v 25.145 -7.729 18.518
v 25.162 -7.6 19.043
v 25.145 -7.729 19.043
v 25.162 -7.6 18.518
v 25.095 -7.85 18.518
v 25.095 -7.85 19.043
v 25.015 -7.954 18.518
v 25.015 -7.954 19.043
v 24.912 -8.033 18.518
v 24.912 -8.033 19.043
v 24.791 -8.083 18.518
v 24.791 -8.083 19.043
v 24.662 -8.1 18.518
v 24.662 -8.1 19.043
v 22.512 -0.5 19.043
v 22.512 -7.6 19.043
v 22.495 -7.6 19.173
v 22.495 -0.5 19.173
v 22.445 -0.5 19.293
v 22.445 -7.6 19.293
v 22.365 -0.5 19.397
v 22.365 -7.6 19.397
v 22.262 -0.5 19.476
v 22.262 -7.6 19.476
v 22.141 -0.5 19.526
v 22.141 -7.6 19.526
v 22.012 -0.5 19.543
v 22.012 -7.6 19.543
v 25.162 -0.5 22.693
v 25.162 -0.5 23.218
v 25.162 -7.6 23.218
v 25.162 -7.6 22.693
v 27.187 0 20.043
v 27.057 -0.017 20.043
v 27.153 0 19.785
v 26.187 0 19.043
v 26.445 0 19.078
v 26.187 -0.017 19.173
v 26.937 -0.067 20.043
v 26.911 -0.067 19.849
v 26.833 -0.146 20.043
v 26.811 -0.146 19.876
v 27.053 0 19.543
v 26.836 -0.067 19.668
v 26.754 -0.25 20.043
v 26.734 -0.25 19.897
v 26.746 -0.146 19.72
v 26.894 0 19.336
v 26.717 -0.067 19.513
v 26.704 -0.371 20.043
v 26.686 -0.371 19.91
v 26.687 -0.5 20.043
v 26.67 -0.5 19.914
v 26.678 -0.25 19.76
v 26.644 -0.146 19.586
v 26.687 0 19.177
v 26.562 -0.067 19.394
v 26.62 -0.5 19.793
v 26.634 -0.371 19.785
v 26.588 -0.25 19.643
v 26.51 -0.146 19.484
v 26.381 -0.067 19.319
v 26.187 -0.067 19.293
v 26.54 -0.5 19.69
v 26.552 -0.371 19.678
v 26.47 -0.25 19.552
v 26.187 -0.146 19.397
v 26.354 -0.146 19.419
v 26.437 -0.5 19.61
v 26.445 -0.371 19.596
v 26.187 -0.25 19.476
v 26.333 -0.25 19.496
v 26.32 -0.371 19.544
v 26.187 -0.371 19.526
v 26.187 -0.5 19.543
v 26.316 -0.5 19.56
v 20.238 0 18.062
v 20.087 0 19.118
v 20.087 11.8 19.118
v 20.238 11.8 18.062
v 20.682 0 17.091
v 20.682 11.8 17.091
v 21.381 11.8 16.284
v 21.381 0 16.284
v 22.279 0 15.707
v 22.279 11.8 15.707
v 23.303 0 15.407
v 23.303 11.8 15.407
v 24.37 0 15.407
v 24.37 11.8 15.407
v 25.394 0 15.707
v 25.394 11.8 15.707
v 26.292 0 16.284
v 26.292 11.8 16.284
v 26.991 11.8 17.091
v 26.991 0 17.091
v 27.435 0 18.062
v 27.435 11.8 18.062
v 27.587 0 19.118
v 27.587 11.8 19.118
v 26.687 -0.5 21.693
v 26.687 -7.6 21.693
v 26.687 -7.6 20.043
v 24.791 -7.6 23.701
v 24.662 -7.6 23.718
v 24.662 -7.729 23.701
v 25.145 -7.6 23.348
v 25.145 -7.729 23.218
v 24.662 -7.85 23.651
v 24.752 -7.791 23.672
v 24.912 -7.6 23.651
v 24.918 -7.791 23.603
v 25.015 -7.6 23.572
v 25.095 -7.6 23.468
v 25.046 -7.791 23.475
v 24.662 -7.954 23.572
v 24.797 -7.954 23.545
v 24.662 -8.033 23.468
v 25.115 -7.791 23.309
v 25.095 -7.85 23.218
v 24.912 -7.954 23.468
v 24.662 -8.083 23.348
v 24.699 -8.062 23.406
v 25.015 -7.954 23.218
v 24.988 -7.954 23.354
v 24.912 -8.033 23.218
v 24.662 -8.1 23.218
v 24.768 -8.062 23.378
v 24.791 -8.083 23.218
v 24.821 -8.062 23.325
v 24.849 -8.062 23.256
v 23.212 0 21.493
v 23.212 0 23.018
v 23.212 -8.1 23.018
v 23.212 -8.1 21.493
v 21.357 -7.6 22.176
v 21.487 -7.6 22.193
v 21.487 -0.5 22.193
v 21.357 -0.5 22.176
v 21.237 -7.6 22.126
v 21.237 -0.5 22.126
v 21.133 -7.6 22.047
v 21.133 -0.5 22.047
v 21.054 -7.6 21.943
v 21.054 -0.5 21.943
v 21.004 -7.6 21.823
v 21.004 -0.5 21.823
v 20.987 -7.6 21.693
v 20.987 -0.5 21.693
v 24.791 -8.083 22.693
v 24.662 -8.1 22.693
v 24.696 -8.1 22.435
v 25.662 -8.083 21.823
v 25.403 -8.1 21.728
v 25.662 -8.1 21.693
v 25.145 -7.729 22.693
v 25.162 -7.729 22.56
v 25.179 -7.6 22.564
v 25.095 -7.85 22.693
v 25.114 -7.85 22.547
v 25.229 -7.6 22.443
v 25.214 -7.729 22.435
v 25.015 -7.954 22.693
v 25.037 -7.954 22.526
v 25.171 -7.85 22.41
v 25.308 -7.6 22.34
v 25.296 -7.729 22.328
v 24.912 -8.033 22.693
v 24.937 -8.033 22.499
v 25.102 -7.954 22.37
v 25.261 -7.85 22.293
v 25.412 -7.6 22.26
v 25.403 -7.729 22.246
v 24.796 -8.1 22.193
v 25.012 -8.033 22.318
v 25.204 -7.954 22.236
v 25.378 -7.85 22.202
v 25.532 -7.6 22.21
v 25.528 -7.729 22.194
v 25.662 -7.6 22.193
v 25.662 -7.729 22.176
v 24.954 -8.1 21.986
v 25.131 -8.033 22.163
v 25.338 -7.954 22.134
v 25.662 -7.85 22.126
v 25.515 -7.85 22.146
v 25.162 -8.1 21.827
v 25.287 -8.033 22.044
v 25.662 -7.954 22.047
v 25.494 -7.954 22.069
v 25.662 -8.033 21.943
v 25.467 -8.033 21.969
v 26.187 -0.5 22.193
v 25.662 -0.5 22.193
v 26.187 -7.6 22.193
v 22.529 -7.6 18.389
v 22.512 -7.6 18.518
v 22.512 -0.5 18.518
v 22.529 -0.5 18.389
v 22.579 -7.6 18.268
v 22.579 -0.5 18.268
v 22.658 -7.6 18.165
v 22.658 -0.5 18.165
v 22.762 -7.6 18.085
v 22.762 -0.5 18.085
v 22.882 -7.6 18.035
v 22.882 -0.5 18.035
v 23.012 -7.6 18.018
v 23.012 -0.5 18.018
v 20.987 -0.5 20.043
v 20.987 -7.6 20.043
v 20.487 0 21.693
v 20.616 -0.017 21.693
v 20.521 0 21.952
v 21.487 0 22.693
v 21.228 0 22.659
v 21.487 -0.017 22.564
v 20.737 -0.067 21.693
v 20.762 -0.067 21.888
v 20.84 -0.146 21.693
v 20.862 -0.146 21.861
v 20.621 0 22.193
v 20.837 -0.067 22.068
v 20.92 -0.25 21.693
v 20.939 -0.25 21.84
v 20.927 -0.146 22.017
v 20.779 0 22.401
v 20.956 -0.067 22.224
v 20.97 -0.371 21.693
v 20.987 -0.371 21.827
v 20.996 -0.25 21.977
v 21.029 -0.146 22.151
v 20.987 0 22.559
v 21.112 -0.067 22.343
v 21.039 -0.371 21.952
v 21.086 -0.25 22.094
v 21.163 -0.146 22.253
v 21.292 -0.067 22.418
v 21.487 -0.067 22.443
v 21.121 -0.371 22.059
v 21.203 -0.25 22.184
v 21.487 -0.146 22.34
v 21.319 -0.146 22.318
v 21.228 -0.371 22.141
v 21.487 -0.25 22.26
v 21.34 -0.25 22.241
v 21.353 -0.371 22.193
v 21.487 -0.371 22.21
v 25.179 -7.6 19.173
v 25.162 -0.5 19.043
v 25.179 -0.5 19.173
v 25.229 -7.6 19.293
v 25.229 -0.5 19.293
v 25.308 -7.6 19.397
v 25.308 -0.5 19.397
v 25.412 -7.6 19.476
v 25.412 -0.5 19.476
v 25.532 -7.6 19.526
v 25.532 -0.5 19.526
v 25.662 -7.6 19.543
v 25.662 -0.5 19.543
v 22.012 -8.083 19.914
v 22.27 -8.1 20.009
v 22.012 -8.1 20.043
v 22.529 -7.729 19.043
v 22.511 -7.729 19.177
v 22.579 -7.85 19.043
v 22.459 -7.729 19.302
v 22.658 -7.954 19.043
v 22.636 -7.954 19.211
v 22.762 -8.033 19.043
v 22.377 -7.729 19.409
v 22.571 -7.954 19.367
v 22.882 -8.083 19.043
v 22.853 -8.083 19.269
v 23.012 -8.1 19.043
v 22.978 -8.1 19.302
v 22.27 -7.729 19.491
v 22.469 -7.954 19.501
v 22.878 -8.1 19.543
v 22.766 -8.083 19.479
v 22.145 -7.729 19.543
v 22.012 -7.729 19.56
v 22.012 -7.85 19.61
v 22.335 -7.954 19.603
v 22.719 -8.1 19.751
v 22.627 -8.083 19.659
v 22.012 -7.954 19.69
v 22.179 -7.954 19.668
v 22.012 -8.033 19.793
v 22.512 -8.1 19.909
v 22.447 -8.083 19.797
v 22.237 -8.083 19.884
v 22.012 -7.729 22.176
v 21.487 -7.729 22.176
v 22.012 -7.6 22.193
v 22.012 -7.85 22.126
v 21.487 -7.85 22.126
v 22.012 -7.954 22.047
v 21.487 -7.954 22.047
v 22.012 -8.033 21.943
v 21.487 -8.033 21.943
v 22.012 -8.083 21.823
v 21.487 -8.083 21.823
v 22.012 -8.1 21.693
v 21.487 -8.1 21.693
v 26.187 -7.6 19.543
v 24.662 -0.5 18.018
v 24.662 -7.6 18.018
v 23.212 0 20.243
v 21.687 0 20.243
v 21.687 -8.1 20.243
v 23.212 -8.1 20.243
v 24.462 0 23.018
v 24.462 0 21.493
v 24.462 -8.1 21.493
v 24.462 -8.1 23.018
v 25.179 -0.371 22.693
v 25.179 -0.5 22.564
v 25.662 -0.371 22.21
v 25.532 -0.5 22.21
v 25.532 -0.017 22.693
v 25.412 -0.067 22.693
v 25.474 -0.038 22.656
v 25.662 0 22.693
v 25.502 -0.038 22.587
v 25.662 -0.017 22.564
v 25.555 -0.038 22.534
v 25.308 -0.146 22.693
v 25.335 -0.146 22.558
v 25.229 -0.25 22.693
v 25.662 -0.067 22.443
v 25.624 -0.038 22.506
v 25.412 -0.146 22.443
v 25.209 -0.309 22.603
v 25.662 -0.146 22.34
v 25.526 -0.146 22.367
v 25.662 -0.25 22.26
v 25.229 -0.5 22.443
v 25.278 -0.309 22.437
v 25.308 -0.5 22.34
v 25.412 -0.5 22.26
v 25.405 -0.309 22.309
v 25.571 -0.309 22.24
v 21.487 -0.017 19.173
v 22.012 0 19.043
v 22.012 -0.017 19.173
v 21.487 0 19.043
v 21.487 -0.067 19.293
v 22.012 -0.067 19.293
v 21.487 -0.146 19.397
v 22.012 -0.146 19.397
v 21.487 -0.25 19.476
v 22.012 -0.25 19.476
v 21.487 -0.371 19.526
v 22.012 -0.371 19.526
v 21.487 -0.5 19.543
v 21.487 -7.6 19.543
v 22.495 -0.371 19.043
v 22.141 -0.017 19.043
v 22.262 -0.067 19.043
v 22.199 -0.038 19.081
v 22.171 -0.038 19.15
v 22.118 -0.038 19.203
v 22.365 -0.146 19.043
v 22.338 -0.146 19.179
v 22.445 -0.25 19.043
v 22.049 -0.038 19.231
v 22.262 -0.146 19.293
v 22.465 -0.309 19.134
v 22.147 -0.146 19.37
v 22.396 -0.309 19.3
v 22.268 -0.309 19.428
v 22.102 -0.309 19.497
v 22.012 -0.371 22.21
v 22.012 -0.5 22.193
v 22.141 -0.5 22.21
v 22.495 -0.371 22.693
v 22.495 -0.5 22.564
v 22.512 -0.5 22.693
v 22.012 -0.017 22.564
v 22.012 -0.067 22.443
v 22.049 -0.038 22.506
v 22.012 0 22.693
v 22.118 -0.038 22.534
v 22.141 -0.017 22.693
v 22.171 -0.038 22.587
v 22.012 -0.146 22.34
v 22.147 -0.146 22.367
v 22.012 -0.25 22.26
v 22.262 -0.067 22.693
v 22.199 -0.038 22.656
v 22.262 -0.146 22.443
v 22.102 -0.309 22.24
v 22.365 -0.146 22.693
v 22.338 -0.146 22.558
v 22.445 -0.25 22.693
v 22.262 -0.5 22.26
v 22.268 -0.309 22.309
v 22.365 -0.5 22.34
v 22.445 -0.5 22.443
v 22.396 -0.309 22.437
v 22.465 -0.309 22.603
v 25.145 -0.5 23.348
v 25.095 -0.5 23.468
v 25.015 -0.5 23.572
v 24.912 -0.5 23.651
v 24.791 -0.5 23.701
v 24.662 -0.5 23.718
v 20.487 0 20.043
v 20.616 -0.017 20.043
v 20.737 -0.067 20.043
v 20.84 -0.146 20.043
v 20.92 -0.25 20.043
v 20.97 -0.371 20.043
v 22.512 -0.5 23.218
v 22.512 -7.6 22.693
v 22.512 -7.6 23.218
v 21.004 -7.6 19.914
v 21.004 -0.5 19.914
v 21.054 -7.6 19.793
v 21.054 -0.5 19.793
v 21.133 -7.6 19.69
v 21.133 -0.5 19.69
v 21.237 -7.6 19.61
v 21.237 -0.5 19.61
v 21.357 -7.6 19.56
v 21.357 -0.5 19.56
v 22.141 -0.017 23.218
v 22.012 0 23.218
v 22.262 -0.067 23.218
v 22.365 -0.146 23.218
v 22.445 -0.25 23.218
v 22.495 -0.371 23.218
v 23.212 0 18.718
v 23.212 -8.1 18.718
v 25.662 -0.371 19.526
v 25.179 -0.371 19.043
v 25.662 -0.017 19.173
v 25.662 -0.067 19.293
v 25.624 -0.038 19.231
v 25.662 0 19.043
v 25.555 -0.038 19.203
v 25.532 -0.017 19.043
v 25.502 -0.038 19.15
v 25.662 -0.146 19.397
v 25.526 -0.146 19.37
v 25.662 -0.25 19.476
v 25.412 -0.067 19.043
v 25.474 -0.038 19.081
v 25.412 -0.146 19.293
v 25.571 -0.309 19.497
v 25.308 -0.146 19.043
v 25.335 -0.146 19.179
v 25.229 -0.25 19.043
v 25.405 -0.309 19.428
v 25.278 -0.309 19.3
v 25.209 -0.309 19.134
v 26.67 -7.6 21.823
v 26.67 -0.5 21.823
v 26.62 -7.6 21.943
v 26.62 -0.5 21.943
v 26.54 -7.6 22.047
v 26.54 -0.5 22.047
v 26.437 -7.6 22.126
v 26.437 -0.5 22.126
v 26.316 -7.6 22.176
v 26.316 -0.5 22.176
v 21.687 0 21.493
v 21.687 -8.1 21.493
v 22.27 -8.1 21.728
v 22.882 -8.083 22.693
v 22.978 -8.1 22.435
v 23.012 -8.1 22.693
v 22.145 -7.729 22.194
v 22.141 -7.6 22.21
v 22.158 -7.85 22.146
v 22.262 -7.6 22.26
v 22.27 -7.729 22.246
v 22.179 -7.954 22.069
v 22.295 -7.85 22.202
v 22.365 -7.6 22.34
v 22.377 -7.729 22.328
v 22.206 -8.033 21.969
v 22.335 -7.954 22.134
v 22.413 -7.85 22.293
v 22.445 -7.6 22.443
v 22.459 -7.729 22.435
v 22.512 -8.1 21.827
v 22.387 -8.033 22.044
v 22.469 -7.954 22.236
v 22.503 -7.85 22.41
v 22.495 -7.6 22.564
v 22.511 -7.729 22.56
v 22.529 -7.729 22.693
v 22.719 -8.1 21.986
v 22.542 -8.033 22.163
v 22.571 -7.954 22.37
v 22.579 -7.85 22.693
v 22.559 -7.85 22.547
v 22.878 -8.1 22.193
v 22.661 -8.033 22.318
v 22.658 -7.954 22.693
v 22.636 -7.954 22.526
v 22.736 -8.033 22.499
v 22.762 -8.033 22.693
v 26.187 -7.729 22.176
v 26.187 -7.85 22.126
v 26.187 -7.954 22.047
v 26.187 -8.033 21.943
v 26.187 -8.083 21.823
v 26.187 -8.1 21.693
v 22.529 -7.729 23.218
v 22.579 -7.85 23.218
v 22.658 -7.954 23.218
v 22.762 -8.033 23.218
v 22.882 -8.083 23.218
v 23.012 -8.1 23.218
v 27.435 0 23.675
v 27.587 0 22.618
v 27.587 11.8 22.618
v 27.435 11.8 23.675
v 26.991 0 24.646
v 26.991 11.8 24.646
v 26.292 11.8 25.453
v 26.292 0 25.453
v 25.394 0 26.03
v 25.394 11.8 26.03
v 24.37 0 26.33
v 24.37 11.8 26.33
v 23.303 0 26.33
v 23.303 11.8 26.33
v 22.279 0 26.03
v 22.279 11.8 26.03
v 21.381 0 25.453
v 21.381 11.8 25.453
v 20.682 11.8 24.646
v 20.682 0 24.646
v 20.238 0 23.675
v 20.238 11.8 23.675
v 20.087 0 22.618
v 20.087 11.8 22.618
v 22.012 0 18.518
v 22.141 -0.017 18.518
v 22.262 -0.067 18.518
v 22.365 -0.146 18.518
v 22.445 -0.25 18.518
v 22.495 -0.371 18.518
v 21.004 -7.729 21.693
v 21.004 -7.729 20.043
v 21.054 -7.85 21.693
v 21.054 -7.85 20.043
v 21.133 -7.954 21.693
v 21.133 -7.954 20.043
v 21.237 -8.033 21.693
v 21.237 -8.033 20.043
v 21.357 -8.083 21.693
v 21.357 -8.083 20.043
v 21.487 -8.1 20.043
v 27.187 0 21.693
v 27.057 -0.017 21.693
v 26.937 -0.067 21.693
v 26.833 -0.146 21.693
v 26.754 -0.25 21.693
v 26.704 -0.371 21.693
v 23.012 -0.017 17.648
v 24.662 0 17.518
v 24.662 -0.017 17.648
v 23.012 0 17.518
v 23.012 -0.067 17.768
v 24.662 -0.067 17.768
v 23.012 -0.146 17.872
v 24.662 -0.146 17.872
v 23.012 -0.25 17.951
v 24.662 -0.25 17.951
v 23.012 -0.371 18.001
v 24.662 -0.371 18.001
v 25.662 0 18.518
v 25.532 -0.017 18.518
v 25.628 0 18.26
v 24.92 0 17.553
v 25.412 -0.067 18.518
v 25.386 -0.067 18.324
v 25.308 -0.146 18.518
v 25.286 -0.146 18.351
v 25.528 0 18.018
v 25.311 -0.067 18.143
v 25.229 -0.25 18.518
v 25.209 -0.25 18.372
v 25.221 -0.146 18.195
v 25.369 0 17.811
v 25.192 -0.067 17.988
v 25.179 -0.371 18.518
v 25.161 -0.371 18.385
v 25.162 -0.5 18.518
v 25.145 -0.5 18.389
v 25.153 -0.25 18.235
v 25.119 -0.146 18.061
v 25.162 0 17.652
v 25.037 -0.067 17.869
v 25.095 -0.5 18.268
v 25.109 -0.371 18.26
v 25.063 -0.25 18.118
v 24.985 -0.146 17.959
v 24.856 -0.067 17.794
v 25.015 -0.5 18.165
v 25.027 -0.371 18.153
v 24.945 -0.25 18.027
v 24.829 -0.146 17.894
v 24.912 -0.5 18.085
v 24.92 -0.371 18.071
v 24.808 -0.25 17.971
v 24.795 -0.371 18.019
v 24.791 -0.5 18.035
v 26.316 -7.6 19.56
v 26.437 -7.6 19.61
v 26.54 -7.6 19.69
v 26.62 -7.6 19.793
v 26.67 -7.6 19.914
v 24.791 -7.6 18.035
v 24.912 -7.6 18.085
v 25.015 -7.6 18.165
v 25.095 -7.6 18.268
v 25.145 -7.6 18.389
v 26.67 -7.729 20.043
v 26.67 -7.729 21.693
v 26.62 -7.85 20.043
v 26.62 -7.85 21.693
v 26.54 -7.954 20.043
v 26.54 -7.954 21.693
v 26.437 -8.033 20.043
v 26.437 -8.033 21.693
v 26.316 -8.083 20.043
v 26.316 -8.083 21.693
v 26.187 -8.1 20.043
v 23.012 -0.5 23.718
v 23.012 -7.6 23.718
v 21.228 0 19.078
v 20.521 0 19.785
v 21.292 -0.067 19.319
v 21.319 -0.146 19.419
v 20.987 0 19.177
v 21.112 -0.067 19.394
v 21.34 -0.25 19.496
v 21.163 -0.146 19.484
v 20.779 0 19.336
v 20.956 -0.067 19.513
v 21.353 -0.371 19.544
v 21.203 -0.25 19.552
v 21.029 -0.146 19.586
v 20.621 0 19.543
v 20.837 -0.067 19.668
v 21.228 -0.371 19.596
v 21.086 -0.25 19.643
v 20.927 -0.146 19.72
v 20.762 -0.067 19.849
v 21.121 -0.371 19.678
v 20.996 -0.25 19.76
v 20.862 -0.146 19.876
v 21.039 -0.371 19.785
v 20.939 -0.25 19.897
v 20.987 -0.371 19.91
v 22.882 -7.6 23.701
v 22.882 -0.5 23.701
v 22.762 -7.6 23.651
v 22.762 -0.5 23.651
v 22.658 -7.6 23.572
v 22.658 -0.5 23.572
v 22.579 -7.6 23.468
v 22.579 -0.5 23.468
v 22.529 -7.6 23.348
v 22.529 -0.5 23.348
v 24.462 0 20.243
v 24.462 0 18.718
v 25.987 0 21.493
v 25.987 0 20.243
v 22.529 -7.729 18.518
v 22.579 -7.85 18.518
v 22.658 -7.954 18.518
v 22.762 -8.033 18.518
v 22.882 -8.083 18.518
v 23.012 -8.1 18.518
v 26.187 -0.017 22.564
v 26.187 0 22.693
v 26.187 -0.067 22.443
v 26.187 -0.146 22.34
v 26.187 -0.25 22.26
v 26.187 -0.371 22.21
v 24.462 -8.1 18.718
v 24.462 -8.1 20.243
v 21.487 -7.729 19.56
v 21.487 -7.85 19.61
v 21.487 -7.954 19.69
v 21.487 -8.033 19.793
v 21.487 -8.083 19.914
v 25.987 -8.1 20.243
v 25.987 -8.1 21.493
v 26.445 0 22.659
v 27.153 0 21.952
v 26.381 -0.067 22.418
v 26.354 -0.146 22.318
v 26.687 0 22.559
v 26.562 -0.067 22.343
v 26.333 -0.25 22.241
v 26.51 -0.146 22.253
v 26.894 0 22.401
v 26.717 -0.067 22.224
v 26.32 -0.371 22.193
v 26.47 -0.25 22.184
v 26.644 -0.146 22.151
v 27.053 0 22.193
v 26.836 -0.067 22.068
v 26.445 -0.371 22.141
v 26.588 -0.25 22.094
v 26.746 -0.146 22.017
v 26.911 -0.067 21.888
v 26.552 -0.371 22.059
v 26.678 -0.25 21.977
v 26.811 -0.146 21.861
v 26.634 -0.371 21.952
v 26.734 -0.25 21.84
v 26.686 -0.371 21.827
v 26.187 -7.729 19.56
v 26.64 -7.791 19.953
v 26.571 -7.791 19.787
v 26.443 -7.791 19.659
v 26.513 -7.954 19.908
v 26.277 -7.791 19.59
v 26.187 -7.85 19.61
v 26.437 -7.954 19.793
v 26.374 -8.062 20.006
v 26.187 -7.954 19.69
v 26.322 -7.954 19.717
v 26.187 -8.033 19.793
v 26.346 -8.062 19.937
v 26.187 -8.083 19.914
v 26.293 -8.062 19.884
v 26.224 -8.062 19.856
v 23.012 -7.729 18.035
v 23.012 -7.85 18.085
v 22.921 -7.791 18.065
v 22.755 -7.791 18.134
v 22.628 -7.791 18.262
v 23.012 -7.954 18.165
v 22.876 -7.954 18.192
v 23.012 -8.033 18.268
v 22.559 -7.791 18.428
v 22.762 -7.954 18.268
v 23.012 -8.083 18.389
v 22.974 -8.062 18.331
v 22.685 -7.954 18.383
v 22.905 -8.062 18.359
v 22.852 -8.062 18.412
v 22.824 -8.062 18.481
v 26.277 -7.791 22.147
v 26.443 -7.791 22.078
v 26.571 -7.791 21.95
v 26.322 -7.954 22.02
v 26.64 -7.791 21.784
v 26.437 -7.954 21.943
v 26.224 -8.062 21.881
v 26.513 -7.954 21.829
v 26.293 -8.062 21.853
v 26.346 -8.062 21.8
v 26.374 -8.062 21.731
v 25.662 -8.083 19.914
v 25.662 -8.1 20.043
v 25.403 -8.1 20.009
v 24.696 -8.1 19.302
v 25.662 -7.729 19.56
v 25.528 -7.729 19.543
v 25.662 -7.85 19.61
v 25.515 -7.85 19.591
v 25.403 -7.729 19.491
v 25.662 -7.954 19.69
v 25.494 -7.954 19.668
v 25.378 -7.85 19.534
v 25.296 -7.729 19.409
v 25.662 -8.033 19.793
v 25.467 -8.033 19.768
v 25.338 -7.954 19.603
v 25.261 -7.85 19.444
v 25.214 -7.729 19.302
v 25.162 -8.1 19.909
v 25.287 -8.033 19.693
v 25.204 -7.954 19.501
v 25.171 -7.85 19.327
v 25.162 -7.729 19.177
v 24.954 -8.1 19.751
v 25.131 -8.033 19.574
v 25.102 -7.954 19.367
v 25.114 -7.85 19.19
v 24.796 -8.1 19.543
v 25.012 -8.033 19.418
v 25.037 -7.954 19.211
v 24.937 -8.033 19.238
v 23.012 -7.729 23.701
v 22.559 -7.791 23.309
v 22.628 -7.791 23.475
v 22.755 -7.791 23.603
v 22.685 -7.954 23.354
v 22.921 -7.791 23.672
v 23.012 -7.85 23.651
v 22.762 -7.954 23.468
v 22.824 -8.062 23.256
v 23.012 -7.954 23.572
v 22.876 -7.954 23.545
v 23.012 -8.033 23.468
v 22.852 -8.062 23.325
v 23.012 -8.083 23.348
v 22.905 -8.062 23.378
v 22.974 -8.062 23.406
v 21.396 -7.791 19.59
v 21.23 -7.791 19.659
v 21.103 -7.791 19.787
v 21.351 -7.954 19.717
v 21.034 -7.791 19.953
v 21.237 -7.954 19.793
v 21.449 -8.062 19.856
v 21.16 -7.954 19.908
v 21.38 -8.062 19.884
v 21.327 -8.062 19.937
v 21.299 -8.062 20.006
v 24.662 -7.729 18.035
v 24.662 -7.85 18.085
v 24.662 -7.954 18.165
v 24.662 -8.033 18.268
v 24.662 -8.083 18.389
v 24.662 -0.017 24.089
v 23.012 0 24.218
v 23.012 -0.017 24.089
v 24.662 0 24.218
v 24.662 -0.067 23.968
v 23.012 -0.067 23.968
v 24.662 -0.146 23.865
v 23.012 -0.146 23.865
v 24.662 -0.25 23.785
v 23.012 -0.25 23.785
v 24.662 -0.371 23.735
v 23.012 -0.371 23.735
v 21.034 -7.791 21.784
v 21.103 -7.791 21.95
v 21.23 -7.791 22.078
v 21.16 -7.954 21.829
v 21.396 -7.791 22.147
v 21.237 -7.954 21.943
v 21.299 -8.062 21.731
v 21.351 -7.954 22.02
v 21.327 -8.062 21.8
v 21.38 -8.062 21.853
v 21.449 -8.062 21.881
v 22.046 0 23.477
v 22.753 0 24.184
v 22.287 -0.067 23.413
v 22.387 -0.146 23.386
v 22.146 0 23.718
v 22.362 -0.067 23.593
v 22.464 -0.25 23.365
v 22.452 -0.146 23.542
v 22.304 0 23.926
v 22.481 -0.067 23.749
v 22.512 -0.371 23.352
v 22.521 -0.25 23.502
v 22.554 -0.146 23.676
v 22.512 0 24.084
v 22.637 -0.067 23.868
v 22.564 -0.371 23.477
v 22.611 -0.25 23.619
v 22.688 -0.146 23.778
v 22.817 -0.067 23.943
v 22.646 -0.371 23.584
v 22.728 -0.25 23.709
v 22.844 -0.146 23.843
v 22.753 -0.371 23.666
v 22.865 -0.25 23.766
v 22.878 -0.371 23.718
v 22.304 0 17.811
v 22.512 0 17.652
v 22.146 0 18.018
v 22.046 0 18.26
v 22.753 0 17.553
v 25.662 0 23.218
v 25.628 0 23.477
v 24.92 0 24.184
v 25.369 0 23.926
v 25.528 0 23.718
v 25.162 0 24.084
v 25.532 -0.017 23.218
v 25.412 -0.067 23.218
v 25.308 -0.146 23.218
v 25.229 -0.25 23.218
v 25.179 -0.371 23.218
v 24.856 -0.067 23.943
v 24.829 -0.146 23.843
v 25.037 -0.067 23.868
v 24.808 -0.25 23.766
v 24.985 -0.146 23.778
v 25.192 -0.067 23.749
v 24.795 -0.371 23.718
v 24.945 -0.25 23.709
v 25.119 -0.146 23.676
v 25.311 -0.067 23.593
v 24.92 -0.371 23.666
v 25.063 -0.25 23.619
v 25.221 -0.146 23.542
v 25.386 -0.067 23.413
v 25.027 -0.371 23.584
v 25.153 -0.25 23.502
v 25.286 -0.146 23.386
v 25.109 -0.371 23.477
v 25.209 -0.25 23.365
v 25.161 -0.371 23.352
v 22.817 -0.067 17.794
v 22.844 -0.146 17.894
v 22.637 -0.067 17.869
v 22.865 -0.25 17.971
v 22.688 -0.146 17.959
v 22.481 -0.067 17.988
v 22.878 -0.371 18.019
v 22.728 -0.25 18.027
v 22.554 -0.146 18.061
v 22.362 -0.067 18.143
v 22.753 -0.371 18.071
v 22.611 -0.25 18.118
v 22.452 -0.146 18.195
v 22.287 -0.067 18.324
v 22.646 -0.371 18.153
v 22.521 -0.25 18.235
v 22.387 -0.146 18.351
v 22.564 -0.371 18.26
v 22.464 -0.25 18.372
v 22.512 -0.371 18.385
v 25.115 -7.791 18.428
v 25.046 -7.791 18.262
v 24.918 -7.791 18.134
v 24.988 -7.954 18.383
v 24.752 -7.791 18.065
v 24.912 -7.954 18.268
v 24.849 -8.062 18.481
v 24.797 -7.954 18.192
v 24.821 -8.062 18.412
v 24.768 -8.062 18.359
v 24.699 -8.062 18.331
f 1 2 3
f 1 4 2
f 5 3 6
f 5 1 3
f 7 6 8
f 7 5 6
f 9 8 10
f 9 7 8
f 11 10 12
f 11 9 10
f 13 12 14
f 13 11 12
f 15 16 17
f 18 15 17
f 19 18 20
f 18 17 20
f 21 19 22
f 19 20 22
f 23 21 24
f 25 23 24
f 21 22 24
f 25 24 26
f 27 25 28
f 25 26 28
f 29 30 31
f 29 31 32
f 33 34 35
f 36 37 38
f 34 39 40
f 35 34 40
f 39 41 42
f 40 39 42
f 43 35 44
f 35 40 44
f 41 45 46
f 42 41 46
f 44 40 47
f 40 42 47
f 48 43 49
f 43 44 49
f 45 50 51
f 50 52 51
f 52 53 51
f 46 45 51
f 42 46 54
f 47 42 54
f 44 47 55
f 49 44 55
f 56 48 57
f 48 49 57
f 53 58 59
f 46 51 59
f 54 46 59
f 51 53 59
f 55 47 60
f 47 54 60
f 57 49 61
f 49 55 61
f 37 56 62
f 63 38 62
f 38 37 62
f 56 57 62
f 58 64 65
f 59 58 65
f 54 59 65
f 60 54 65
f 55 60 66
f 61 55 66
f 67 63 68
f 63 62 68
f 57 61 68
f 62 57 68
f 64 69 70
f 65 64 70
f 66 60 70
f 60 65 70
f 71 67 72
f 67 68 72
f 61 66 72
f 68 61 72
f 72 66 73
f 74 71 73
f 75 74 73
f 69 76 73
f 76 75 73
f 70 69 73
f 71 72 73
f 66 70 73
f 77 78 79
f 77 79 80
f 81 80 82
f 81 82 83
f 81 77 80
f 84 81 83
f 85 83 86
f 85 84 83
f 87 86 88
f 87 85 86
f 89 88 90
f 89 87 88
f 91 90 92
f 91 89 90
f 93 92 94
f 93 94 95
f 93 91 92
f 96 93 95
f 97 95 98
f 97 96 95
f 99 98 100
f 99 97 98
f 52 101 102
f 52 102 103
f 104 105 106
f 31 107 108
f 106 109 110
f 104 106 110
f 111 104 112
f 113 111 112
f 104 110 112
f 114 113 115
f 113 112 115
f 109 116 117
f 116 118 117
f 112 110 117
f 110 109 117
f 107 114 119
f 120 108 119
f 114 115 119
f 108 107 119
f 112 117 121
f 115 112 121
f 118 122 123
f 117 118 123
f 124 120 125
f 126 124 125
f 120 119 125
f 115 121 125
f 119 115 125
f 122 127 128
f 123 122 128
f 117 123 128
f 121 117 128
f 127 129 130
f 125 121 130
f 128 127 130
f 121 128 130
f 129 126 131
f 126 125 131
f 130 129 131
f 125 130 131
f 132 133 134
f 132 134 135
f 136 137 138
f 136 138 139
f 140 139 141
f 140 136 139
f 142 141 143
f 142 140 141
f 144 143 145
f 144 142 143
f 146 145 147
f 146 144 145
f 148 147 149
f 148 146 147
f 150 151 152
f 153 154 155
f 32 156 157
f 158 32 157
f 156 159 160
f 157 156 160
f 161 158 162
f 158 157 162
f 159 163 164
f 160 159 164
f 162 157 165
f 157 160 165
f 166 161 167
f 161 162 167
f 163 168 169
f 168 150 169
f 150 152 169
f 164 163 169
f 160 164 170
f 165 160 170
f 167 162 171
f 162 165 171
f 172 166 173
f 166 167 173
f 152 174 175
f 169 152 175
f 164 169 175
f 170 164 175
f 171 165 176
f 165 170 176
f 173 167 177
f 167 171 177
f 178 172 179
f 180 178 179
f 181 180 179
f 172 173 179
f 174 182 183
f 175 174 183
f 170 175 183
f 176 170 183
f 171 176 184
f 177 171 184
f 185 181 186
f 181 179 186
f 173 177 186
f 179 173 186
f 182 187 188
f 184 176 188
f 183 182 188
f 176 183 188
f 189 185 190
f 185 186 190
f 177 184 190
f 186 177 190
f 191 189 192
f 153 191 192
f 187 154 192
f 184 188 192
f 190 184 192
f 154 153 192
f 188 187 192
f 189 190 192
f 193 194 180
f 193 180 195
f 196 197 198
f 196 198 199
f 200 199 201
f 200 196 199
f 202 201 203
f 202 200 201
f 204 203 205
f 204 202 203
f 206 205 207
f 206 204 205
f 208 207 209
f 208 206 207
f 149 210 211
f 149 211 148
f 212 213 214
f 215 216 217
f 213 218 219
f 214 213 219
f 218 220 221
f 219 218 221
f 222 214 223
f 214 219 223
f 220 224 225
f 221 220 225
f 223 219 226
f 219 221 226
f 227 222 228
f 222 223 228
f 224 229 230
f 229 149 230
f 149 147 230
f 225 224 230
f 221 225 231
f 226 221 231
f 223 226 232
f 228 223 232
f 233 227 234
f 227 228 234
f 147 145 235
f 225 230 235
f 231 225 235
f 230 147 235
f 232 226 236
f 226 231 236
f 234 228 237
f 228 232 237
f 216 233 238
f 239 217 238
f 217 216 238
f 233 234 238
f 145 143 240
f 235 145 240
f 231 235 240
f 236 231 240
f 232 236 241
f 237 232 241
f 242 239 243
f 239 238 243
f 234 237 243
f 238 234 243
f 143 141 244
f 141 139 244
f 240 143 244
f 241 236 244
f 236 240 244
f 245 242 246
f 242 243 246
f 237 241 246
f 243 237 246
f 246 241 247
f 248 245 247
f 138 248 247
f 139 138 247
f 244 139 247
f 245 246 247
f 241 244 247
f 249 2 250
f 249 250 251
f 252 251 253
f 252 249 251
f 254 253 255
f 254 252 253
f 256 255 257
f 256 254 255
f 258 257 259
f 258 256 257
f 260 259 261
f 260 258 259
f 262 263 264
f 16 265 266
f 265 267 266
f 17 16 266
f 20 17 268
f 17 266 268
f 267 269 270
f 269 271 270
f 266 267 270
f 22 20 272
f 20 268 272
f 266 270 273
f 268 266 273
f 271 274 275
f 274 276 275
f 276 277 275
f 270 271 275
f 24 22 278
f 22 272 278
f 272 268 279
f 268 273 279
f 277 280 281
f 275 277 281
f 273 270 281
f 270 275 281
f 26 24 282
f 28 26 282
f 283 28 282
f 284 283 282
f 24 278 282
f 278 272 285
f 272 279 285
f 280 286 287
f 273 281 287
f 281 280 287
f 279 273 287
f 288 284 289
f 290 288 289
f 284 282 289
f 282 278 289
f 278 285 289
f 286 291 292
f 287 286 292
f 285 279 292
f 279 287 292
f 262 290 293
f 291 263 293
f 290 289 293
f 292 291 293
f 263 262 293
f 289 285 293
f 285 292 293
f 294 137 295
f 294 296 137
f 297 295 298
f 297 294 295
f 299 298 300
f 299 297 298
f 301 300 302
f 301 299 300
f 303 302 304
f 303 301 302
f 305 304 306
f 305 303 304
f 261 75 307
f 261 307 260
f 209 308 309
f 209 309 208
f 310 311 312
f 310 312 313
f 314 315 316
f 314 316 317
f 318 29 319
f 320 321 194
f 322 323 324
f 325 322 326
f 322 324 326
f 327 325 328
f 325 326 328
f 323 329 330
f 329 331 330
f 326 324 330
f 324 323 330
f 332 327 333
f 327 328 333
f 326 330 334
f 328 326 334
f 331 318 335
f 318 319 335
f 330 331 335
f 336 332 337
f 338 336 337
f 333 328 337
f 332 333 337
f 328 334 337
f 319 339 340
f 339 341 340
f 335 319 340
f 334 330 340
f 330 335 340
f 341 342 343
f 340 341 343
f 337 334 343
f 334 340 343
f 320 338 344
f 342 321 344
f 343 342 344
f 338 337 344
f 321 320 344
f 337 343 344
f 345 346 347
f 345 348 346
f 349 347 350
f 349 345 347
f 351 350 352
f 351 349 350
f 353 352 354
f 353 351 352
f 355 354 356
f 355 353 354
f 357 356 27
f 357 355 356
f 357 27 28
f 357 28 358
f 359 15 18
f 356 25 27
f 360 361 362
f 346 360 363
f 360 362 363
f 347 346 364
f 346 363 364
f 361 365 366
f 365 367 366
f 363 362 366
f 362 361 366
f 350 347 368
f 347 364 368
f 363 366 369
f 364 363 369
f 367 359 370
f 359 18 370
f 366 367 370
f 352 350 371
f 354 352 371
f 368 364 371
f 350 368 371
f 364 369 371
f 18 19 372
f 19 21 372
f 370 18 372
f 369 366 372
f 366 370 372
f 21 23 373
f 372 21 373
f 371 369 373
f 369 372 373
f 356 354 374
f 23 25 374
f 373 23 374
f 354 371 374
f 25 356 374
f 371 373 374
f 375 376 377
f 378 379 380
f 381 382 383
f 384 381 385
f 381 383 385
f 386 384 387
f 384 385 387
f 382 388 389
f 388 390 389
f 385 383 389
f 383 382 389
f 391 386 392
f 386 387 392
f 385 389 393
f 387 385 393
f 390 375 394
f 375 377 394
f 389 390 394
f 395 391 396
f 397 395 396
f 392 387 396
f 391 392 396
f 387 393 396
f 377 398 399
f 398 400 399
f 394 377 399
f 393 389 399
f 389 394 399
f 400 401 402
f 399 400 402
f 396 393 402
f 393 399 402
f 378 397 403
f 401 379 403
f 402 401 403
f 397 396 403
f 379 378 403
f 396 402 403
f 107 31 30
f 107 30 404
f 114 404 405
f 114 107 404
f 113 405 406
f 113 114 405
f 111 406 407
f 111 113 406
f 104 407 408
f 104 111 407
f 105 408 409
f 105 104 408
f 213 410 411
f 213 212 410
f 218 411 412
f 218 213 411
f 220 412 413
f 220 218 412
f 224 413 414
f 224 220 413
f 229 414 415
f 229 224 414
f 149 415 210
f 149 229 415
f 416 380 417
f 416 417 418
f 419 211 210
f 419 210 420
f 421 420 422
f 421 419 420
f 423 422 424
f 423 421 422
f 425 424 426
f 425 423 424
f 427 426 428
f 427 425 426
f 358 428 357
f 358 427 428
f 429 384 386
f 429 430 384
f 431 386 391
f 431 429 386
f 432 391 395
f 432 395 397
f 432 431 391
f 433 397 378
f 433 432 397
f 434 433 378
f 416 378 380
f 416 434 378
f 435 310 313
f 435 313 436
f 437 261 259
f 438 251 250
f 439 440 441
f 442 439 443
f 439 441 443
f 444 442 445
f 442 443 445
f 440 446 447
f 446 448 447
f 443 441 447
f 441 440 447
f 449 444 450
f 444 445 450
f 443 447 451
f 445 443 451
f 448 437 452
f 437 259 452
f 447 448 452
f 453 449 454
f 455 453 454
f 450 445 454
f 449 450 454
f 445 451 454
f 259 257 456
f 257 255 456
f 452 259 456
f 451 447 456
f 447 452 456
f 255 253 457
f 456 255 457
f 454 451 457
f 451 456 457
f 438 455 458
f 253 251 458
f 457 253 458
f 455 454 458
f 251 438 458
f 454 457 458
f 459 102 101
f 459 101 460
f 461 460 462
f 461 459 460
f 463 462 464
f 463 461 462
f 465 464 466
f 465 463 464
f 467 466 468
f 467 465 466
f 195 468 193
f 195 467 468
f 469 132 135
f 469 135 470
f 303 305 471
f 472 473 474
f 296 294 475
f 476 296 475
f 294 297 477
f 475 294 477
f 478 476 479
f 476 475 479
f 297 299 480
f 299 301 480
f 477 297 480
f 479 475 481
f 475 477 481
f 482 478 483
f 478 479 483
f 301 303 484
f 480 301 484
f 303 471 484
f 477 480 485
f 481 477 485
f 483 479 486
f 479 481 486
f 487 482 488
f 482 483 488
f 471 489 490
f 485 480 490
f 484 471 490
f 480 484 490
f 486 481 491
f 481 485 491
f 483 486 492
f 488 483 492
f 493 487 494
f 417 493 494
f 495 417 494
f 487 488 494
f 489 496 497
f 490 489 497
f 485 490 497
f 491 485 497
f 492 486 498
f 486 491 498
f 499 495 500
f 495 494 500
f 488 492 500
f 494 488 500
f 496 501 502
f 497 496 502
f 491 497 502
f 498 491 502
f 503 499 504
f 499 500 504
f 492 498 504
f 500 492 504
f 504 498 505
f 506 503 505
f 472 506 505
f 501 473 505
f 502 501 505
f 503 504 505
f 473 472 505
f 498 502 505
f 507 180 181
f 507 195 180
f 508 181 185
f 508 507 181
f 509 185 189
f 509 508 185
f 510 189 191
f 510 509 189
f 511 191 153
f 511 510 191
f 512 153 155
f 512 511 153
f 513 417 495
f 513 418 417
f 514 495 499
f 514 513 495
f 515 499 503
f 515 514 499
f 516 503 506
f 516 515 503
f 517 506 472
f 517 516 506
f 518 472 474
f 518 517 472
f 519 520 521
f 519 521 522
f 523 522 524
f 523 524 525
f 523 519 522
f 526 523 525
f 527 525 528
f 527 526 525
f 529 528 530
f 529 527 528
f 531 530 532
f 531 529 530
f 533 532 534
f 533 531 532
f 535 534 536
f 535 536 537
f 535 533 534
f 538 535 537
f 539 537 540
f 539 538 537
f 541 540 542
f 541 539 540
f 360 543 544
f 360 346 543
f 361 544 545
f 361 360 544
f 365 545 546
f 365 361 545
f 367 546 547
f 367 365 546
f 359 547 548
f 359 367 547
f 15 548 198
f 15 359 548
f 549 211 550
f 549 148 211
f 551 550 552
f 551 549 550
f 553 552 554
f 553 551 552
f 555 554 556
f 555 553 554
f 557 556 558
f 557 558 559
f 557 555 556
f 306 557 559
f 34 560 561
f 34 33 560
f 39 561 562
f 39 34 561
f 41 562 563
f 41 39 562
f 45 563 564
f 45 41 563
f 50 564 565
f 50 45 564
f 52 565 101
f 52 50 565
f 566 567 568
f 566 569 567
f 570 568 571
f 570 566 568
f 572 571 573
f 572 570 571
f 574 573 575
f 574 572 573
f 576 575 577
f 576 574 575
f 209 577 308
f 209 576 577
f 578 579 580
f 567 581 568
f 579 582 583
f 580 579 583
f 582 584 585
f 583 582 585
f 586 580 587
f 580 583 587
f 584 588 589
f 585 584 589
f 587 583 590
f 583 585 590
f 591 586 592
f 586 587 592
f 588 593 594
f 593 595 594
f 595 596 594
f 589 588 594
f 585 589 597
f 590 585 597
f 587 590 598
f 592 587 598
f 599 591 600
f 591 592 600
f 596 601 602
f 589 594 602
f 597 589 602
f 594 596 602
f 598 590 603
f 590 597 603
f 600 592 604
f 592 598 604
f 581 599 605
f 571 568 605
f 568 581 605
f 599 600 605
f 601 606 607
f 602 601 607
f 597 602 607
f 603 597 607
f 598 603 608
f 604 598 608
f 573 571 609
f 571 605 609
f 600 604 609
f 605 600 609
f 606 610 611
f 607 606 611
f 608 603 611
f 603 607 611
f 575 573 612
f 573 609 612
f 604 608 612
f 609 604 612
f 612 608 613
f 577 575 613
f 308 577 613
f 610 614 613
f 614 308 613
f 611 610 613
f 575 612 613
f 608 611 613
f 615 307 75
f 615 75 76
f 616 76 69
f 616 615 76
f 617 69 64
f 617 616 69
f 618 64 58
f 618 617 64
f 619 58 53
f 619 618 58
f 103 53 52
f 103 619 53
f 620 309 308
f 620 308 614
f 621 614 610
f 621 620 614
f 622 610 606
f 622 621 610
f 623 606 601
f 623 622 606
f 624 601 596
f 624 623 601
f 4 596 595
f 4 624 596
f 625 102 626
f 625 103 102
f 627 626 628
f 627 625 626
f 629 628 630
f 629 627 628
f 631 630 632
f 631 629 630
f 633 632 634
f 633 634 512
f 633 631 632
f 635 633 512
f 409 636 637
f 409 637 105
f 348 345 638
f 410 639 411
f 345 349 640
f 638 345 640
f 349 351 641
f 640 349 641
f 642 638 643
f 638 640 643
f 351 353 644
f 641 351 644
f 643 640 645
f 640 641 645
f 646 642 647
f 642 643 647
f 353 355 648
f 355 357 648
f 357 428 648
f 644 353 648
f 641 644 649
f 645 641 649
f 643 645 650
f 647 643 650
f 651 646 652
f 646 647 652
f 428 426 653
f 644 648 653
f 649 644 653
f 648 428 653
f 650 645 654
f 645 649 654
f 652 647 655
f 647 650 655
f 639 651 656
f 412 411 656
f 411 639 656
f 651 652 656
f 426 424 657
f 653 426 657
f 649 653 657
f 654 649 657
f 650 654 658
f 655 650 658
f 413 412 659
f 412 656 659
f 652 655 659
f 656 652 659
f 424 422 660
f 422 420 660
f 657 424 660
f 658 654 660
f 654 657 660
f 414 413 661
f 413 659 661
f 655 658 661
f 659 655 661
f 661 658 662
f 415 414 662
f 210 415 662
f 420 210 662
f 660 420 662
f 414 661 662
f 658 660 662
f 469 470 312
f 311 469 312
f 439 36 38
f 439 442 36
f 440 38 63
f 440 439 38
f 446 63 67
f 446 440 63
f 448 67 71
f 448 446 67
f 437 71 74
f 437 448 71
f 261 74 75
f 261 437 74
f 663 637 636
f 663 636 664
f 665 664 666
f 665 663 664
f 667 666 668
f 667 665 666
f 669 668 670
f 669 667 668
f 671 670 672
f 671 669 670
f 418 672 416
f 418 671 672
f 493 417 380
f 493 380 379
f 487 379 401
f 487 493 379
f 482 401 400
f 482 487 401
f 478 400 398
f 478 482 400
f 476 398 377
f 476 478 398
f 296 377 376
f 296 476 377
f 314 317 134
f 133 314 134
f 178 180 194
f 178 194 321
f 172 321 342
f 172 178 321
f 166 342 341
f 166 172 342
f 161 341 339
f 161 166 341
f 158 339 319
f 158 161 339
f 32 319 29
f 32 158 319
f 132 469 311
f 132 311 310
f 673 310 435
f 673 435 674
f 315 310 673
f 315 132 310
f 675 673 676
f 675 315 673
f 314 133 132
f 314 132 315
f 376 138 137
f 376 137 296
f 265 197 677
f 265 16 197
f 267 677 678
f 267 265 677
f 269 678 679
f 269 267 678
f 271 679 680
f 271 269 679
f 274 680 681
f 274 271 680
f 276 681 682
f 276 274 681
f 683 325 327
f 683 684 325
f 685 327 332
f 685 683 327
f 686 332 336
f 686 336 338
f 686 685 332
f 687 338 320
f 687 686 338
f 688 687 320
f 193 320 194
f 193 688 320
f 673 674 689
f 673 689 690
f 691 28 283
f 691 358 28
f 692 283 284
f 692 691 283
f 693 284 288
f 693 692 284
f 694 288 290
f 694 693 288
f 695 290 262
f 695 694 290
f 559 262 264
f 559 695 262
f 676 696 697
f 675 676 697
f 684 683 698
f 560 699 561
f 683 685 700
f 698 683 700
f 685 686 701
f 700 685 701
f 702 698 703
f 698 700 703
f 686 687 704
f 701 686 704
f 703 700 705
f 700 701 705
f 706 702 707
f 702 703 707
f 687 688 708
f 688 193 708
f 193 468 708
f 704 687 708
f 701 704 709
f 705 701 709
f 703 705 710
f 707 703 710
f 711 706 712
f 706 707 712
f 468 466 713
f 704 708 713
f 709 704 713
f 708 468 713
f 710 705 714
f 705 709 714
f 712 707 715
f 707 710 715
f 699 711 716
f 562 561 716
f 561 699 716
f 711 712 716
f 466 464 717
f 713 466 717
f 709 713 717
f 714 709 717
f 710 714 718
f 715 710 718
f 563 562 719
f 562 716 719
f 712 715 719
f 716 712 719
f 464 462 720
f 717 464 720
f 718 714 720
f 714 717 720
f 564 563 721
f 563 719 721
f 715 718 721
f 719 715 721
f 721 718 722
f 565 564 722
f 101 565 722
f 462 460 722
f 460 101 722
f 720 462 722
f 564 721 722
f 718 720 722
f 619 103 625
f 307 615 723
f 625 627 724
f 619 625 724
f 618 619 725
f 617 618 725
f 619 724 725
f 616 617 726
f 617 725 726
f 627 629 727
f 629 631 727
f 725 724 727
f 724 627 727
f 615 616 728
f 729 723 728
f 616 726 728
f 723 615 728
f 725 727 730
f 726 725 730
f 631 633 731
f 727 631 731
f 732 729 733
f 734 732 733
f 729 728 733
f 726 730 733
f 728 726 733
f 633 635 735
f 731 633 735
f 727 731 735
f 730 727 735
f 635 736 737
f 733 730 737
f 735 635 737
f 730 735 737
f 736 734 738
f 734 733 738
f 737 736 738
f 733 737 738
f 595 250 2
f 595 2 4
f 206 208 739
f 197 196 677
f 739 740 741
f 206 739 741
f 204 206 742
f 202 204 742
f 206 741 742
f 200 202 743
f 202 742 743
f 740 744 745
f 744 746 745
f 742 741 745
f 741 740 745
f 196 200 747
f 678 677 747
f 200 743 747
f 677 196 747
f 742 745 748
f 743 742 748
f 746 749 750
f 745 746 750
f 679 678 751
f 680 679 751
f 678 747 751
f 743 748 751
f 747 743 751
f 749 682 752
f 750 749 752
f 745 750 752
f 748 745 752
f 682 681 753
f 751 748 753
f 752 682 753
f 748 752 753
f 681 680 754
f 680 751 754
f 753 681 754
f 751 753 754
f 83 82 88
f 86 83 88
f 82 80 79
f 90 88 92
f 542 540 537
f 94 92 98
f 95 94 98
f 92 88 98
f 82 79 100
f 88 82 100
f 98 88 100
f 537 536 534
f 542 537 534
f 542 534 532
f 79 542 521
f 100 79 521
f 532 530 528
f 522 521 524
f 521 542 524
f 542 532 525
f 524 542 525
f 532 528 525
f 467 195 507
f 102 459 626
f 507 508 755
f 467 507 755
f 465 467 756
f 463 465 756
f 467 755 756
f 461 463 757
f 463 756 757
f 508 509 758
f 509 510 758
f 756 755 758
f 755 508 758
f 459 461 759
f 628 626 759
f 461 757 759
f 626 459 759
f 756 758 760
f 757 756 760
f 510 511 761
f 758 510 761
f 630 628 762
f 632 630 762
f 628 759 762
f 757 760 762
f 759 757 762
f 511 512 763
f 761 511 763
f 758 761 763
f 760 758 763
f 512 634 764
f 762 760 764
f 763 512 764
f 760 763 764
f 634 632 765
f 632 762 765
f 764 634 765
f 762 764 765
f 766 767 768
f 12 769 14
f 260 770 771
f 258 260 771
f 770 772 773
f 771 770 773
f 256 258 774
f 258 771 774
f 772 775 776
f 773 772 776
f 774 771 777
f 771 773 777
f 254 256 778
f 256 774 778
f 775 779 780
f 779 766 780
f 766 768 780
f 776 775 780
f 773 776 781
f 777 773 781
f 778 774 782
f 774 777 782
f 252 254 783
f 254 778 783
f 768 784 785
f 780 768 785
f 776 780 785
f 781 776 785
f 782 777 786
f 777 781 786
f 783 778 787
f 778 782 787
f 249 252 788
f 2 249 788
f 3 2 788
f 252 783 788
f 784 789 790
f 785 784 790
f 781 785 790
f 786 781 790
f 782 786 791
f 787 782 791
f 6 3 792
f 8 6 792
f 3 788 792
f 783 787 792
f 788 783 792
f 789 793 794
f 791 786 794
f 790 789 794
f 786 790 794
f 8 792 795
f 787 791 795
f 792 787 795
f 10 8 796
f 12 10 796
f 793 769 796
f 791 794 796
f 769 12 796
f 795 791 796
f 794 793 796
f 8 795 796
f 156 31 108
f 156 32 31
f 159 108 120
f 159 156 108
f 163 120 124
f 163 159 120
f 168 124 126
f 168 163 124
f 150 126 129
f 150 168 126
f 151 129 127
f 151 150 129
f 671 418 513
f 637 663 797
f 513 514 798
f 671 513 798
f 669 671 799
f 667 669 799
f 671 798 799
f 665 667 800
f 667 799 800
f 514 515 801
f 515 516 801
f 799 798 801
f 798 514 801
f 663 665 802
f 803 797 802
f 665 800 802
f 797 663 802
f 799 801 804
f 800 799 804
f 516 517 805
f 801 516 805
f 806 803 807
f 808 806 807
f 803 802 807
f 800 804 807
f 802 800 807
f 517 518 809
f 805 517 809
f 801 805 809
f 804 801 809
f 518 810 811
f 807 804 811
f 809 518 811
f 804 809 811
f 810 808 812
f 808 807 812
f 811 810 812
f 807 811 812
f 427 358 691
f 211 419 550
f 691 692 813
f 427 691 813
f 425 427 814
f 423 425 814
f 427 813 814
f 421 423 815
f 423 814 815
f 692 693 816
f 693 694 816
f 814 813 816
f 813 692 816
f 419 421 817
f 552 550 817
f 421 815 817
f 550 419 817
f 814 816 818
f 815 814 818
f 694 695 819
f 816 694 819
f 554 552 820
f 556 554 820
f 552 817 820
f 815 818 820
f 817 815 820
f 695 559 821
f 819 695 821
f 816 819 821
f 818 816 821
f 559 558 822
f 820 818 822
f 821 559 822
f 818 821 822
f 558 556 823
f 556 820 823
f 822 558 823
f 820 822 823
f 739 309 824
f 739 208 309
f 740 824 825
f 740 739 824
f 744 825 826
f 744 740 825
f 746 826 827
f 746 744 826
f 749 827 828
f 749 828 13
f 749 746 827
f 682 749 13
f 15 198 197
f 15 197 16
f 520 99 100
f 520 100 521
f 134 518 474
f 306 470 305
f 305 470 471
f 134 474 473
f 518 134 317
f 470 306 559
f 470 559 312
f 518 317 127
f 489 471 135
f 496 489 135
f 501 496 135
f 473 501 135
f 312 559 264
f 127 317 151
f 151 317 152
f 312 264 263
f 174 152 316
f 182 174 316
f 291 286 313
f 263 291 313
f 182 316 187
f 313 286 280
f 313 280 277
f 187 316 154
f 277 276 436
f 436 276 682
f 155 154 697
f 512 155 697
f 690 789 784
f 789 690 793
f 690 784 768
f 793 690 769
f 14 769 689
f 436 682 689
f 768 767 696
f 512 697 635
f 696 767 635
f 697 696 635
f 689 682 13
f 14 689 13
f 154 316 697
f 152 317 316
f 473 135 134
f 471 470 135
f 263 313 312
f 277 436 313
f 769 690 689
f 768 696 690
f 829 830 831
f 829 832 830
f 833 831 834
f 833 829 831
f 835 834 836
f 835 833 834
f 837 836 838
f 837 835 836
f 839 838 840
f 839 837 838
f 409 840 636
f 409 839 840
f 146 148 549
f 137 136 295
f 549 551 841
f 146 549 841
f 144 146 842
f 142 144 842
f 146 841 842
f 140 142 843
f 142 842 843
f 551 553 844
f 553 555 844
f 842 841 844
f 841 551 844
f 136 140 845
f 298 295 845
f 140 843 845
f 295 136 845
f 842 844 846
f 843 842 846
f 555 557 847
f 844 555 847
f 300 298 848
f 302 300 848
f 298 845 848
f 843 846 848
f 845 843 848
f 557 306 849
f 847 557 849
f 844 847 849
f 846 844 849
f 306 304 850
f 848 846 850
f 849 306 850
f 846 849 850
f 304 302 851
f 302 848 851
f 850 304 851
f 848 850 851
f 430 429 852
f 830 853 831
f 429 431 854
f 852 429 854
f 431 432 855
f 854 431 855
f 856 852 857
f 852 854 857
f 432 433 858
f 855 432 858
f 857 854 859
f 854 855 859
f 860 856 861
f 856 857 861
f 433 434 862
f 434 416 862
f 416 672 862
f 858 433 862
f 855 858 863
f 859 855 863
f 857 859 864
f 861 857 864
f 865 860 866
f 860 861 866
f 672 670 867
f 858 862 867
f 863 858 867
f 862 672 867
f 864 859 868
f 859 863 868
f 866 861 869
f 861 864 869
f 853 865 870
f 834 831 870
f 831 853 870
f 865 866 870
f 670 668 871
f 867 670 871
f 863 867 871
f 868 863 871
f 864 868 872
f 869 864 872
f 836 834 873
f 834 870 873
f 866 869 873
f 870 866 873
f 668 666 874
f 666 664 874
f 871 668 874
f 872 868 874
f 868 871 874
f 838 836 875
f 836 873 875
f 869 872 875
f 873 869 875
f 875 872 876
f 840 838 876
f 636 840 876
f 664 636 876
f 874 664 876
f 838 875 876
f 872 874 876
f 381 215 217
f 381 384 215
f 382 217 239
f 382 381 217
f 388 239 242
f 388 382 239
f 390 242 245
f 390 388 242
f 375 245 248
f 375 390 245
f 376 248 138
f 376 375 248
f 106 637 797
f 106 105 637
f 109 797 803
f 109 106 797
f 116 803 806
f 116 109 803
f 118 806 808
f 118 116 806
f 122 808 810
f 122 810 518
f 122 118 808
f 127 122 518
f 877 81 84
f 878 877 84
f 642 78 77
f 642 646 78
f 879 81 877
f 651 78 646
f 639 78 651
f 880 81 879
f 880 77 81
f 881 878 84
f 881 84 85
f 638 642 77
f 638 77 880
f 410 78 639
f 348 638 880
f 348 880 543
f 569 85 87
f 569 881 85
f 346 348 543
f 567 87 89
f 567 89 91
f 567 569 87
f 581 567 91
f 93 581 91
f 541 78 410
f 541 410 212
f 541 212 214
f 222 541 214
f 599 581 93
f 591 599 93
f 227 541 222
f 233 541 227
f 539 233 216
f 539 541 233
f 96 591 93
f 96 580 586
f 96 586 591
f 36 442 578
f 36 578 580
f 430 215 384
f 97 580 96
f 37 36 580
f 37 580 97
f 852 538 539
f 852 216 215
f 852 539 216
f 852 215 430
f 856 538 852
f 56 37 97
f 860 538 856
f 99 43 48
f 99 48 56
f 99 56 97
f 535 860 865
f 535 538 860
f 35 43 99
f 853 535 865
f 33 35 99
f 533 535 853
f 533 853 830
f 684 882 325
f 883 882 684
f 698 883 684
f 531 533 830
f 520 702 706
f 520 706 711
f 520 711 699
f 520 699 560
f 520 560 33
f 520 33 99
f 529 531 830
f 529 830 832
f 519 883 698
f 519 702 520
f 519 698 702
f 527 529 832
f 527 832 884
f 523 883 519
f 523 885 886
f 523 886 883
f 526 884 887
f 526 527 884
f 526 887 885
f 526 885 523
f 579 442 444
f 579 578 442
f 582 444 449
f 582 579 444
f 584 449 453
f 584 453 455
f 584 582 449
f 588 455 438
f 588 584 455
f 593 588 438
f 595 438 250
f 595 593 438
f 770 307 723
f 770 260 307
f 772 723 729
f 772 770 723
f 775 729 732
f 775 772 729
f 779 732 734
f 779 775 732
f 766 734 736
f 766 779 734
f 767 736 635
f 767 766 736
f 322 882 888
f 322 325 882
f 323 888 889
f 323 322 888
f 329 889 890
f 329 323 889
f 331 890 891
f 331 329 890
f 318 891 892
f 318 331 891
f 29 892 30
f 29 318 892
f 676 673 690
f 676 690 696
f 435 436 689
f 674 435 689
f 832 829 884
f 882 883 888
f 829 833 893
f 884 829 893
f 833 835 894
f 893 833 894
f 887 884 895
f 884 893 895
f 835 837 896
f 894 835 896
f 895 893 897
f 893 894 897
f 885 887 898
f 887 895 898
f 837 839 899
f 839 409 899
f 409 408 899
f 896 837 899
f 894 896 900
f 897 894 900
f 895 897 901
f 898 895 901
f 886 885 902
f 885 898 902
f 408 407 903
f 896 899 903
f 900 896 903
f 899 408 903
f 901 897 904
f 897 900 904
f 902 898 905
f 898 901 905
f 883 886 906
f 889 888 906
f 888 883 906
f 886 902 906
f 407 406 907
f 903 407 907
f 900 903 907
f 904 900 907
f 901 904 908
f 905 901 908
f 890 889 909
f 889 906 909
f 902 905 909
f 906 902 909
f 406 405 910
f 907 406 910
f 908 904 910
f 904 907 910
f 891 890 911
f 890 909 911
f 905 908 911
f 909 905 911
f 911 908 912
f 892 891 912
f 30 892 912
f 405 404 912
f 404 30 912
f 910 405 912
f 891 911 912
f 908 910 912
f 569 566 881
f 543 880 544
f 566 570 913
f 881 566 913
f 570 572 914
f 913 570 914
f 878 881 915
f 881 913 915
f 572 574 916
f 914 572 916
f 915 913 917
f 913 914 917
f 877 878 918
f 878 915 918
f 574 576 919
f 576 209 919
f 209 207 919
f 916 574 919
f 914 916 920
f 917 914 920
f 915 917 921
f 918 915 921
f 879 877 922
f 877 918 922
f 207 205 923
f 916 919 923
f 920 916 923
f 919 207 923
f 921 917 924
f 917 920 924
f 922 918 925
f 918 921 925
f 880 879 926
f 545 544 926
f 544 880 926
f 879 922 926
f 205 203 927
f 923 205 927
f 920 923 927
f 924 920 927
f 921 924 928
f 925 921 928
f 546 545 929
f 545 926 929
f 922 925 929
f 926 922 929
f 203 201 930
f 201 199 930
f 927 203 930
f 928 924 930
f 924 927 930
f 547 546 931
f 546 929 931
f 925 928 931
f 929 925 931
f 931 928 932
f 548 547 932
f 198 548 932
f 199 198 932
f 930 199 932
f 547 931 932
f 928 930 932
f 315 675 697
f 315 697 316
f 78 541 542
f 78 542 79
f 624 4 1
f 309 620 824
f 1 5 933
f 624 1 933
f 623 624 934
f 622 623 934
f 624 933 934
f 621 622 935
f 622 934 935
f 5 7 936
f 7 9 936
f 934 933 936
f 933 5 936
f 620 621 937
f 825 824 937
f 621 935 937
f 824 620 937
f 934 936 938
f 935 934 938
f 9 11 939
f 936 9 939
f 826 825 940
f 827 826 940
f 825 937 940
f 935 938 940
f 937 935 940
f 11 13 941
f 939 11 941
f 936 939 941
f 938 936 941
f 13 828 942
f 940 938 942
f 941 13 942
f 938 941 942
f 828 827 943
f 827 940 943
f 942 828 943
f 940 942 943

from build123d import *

# Parameters (mm, degrees)
BOSS_EXTRUDE1_DEPTH = 8.1
BOSS_EXTRUDE2_DEPTH = 11.8
FILLET1_R           = 0.5
FILLET2_R           = 0.5
FILLET4_R           = 0.5


with BuildPart() as part:
    # Sketch8 → Boss-Extrude1 (new body)
    with BuildSketch(Plane(origin=(-2.232753674, 0, 0.665681661), x_dir=(-1, 0, 0), z_dir=(0, -1, 0))):
        Polygon((-24.744344877, -18.877779499), (-23.219344877, -18.877779499), (-23.219344877, -21.527779499), (-24.744344877, -21.527779499), (-24.744344877, -23.052779499), (-27.394344877, -23.052779499), (-27.394344877, -21.527779499), (-28.919344877, -21.527779499), (-28.919344877, -18.877779499), (-27.394344877, -18.877779499), (-27.394344877, -17.352779499), (-24.744344877, -17.352779499), align=None)
        Polygon((-26.694344877, -20.827779499), (-26.694344877, -22.352779499), (-25.444344877, -22.352779499), (-25.444344877, -20.827779499), (-23.919344877, -20.827779499), (-23.919344877, -19.577779499), (-25.444344877, -19.577779499), (-25.444344877, -18.052779499), (-26.694344877, -18.052779499), (-26.694344877, -19.577779499), (-28.219344877, -19.577779499), (-28.219344877, -20.827779499), align=None, mode=Mode.SUBTRACT)
    extrude(amount=BOSS_EXTRUDE1_DEPTH)

    # Sketch9 → Boss-Extrude2 (add)
    with BuildSketch(Plane(origin=(0, 0, 0), x_dir=(-1, 0, 0), z_dir=(0, 1, 0))):
        with BuildLine():
            Line((-20.086591203, 22.61846116), (-20.086591203, 19.11846116))
            ThreePointArc((-20.086591203, 19.11846116), (-23.836591203, 15.36846116), (-27.586591203, 19.11846116))
            Line((-27.586591203, 19.11846116), (-27.586591203, 22.61846116))
            ThreePointArc((-27.586591203, 22.61846116), (-23.836591203, 26.36846116), (-20.086591203, 22.61846116))
        make_face()
    extrude(amount=BOSS_EXTRUDE2_DEPTH)

    # Fillet1
    fillet1_edges = [part.edges().sort_by_distance(p)[0] for p in [
        (22.511591203, -4.05, 19.54346116),
        (20.986591203, -4.05, 19.54346116),
        (20.986591203, -4.05, 22.19346116),
        (22.511591203, -4.05, 22.19346116),
        (22.511591203, -4.05, 23.71846116),
        (25.161591203, -4.05, 23.71846116),
        (25.161591203, -4.05, 22.19346116),
        (26.686591203, -4.05, 22.19346116),
        (26.686591203, -4.05, 19.54346116),
        (25.161591203, -4.05, 19.54346116),
        (25.161591203, -4.05, 18.01846116),
        (22.511591203, -4.05, 18.01846116),
    ]]
    fillet(fillet1_edges, radius=FILLET1_R)

    # Fillet2
    fillet2_edges = [part.edges().sort_by_distance(p)[0] for p in [
        (21.749091203, 0, 19.54346116),
        (20.986591203, 0, 20.86846116),
        (21.749091203, 0, 22.19346116),
        (22.511591203, 0, 22.95596116),
        (23.836591203, 0, 23.71846116),
        (25.161591203, 0, 22.95596116),
        (25.924091203, 0, 22.19346116),
        (26.686591203, 0, 20.86846116),
        (25.924091203, 0, 19.54346116),
        (25.161591203, 0, 18.78096116),
        (23.836591203, 0, 18.01846116),
        (25.308037813, 0, 19.39701455),
        (25.308037813, 0, 22.339907769),
        (22.365144594, 0, 22.339907769),
        (22.365144594, 0, 19.39701455),
        (21.133037813, 0, 19.689907769),
        (21.133037813, 0, 22.04701455),
        (22.658037813, 0, 23.57201455),
        (25.015144594, 0, 23.57201455),
        (26.540144594, 0, 22.04701455),
        (26.540144594, 0, 19.689907769),
        (22.658037813, 0, 18.164907769),
        (25.015144594, 0, 18.164907769),
        (22.511591203, 0, 18.78096116),
    ]]
    fillet(fillet2_edges, radius=FILLET2_R)

    # Fillet4
    fillet4_edges = [part.edges().sort_by_distance(p)[0] for p in [
        (21.749091203, -8.1, 19.54346116),
        (20.986591203, -8.1, 20.86846116),
        (23.836591203, -8.1, 18.01846116),
        (25.161591203, -8.1, 18.78096116),
        (25.924091203, -8.1, 19.54346116),
        (26.686591203, -8.1, 20.86846116),
        (25.924091203, -8.1, 22.19346116),
        (25.161591203, -8.1, 22.95596116),
        (23.836591203, -8.1, 23.71846116),
        (22.511591203, -8.1, 22.95596116),
        (21.749091203, -8.1, 22.19346116),
        (25.015144594, -8.1, 18.164907769),
        (22.658037813, -8.1, 18.164907769),
        (26.540144594, -8.1, 19.689907769),
        (26.540144594, -8.1, 22.04701455),
        (25.015144594, -8.1, 23.57201455),
        (22.658037813, -8.1, 23.57201455),
        (21.133037813, -8.1, 22.04701455),
        (21.133037813, -8.1, 19.689907769),
        (22.365144594, -8.1, 19.39701455),
        (22.365144594, -8.1, 22.339907769),
        (25.308037813, -8.1, 22.339907769),
        (25.308037813, -8.1, 19.39701455),
        (22.511591203, -8.1, 18.78096116),
    ]]
    fillet(fillet4_edges, radius=FILLET4_R)


solid = part.part
